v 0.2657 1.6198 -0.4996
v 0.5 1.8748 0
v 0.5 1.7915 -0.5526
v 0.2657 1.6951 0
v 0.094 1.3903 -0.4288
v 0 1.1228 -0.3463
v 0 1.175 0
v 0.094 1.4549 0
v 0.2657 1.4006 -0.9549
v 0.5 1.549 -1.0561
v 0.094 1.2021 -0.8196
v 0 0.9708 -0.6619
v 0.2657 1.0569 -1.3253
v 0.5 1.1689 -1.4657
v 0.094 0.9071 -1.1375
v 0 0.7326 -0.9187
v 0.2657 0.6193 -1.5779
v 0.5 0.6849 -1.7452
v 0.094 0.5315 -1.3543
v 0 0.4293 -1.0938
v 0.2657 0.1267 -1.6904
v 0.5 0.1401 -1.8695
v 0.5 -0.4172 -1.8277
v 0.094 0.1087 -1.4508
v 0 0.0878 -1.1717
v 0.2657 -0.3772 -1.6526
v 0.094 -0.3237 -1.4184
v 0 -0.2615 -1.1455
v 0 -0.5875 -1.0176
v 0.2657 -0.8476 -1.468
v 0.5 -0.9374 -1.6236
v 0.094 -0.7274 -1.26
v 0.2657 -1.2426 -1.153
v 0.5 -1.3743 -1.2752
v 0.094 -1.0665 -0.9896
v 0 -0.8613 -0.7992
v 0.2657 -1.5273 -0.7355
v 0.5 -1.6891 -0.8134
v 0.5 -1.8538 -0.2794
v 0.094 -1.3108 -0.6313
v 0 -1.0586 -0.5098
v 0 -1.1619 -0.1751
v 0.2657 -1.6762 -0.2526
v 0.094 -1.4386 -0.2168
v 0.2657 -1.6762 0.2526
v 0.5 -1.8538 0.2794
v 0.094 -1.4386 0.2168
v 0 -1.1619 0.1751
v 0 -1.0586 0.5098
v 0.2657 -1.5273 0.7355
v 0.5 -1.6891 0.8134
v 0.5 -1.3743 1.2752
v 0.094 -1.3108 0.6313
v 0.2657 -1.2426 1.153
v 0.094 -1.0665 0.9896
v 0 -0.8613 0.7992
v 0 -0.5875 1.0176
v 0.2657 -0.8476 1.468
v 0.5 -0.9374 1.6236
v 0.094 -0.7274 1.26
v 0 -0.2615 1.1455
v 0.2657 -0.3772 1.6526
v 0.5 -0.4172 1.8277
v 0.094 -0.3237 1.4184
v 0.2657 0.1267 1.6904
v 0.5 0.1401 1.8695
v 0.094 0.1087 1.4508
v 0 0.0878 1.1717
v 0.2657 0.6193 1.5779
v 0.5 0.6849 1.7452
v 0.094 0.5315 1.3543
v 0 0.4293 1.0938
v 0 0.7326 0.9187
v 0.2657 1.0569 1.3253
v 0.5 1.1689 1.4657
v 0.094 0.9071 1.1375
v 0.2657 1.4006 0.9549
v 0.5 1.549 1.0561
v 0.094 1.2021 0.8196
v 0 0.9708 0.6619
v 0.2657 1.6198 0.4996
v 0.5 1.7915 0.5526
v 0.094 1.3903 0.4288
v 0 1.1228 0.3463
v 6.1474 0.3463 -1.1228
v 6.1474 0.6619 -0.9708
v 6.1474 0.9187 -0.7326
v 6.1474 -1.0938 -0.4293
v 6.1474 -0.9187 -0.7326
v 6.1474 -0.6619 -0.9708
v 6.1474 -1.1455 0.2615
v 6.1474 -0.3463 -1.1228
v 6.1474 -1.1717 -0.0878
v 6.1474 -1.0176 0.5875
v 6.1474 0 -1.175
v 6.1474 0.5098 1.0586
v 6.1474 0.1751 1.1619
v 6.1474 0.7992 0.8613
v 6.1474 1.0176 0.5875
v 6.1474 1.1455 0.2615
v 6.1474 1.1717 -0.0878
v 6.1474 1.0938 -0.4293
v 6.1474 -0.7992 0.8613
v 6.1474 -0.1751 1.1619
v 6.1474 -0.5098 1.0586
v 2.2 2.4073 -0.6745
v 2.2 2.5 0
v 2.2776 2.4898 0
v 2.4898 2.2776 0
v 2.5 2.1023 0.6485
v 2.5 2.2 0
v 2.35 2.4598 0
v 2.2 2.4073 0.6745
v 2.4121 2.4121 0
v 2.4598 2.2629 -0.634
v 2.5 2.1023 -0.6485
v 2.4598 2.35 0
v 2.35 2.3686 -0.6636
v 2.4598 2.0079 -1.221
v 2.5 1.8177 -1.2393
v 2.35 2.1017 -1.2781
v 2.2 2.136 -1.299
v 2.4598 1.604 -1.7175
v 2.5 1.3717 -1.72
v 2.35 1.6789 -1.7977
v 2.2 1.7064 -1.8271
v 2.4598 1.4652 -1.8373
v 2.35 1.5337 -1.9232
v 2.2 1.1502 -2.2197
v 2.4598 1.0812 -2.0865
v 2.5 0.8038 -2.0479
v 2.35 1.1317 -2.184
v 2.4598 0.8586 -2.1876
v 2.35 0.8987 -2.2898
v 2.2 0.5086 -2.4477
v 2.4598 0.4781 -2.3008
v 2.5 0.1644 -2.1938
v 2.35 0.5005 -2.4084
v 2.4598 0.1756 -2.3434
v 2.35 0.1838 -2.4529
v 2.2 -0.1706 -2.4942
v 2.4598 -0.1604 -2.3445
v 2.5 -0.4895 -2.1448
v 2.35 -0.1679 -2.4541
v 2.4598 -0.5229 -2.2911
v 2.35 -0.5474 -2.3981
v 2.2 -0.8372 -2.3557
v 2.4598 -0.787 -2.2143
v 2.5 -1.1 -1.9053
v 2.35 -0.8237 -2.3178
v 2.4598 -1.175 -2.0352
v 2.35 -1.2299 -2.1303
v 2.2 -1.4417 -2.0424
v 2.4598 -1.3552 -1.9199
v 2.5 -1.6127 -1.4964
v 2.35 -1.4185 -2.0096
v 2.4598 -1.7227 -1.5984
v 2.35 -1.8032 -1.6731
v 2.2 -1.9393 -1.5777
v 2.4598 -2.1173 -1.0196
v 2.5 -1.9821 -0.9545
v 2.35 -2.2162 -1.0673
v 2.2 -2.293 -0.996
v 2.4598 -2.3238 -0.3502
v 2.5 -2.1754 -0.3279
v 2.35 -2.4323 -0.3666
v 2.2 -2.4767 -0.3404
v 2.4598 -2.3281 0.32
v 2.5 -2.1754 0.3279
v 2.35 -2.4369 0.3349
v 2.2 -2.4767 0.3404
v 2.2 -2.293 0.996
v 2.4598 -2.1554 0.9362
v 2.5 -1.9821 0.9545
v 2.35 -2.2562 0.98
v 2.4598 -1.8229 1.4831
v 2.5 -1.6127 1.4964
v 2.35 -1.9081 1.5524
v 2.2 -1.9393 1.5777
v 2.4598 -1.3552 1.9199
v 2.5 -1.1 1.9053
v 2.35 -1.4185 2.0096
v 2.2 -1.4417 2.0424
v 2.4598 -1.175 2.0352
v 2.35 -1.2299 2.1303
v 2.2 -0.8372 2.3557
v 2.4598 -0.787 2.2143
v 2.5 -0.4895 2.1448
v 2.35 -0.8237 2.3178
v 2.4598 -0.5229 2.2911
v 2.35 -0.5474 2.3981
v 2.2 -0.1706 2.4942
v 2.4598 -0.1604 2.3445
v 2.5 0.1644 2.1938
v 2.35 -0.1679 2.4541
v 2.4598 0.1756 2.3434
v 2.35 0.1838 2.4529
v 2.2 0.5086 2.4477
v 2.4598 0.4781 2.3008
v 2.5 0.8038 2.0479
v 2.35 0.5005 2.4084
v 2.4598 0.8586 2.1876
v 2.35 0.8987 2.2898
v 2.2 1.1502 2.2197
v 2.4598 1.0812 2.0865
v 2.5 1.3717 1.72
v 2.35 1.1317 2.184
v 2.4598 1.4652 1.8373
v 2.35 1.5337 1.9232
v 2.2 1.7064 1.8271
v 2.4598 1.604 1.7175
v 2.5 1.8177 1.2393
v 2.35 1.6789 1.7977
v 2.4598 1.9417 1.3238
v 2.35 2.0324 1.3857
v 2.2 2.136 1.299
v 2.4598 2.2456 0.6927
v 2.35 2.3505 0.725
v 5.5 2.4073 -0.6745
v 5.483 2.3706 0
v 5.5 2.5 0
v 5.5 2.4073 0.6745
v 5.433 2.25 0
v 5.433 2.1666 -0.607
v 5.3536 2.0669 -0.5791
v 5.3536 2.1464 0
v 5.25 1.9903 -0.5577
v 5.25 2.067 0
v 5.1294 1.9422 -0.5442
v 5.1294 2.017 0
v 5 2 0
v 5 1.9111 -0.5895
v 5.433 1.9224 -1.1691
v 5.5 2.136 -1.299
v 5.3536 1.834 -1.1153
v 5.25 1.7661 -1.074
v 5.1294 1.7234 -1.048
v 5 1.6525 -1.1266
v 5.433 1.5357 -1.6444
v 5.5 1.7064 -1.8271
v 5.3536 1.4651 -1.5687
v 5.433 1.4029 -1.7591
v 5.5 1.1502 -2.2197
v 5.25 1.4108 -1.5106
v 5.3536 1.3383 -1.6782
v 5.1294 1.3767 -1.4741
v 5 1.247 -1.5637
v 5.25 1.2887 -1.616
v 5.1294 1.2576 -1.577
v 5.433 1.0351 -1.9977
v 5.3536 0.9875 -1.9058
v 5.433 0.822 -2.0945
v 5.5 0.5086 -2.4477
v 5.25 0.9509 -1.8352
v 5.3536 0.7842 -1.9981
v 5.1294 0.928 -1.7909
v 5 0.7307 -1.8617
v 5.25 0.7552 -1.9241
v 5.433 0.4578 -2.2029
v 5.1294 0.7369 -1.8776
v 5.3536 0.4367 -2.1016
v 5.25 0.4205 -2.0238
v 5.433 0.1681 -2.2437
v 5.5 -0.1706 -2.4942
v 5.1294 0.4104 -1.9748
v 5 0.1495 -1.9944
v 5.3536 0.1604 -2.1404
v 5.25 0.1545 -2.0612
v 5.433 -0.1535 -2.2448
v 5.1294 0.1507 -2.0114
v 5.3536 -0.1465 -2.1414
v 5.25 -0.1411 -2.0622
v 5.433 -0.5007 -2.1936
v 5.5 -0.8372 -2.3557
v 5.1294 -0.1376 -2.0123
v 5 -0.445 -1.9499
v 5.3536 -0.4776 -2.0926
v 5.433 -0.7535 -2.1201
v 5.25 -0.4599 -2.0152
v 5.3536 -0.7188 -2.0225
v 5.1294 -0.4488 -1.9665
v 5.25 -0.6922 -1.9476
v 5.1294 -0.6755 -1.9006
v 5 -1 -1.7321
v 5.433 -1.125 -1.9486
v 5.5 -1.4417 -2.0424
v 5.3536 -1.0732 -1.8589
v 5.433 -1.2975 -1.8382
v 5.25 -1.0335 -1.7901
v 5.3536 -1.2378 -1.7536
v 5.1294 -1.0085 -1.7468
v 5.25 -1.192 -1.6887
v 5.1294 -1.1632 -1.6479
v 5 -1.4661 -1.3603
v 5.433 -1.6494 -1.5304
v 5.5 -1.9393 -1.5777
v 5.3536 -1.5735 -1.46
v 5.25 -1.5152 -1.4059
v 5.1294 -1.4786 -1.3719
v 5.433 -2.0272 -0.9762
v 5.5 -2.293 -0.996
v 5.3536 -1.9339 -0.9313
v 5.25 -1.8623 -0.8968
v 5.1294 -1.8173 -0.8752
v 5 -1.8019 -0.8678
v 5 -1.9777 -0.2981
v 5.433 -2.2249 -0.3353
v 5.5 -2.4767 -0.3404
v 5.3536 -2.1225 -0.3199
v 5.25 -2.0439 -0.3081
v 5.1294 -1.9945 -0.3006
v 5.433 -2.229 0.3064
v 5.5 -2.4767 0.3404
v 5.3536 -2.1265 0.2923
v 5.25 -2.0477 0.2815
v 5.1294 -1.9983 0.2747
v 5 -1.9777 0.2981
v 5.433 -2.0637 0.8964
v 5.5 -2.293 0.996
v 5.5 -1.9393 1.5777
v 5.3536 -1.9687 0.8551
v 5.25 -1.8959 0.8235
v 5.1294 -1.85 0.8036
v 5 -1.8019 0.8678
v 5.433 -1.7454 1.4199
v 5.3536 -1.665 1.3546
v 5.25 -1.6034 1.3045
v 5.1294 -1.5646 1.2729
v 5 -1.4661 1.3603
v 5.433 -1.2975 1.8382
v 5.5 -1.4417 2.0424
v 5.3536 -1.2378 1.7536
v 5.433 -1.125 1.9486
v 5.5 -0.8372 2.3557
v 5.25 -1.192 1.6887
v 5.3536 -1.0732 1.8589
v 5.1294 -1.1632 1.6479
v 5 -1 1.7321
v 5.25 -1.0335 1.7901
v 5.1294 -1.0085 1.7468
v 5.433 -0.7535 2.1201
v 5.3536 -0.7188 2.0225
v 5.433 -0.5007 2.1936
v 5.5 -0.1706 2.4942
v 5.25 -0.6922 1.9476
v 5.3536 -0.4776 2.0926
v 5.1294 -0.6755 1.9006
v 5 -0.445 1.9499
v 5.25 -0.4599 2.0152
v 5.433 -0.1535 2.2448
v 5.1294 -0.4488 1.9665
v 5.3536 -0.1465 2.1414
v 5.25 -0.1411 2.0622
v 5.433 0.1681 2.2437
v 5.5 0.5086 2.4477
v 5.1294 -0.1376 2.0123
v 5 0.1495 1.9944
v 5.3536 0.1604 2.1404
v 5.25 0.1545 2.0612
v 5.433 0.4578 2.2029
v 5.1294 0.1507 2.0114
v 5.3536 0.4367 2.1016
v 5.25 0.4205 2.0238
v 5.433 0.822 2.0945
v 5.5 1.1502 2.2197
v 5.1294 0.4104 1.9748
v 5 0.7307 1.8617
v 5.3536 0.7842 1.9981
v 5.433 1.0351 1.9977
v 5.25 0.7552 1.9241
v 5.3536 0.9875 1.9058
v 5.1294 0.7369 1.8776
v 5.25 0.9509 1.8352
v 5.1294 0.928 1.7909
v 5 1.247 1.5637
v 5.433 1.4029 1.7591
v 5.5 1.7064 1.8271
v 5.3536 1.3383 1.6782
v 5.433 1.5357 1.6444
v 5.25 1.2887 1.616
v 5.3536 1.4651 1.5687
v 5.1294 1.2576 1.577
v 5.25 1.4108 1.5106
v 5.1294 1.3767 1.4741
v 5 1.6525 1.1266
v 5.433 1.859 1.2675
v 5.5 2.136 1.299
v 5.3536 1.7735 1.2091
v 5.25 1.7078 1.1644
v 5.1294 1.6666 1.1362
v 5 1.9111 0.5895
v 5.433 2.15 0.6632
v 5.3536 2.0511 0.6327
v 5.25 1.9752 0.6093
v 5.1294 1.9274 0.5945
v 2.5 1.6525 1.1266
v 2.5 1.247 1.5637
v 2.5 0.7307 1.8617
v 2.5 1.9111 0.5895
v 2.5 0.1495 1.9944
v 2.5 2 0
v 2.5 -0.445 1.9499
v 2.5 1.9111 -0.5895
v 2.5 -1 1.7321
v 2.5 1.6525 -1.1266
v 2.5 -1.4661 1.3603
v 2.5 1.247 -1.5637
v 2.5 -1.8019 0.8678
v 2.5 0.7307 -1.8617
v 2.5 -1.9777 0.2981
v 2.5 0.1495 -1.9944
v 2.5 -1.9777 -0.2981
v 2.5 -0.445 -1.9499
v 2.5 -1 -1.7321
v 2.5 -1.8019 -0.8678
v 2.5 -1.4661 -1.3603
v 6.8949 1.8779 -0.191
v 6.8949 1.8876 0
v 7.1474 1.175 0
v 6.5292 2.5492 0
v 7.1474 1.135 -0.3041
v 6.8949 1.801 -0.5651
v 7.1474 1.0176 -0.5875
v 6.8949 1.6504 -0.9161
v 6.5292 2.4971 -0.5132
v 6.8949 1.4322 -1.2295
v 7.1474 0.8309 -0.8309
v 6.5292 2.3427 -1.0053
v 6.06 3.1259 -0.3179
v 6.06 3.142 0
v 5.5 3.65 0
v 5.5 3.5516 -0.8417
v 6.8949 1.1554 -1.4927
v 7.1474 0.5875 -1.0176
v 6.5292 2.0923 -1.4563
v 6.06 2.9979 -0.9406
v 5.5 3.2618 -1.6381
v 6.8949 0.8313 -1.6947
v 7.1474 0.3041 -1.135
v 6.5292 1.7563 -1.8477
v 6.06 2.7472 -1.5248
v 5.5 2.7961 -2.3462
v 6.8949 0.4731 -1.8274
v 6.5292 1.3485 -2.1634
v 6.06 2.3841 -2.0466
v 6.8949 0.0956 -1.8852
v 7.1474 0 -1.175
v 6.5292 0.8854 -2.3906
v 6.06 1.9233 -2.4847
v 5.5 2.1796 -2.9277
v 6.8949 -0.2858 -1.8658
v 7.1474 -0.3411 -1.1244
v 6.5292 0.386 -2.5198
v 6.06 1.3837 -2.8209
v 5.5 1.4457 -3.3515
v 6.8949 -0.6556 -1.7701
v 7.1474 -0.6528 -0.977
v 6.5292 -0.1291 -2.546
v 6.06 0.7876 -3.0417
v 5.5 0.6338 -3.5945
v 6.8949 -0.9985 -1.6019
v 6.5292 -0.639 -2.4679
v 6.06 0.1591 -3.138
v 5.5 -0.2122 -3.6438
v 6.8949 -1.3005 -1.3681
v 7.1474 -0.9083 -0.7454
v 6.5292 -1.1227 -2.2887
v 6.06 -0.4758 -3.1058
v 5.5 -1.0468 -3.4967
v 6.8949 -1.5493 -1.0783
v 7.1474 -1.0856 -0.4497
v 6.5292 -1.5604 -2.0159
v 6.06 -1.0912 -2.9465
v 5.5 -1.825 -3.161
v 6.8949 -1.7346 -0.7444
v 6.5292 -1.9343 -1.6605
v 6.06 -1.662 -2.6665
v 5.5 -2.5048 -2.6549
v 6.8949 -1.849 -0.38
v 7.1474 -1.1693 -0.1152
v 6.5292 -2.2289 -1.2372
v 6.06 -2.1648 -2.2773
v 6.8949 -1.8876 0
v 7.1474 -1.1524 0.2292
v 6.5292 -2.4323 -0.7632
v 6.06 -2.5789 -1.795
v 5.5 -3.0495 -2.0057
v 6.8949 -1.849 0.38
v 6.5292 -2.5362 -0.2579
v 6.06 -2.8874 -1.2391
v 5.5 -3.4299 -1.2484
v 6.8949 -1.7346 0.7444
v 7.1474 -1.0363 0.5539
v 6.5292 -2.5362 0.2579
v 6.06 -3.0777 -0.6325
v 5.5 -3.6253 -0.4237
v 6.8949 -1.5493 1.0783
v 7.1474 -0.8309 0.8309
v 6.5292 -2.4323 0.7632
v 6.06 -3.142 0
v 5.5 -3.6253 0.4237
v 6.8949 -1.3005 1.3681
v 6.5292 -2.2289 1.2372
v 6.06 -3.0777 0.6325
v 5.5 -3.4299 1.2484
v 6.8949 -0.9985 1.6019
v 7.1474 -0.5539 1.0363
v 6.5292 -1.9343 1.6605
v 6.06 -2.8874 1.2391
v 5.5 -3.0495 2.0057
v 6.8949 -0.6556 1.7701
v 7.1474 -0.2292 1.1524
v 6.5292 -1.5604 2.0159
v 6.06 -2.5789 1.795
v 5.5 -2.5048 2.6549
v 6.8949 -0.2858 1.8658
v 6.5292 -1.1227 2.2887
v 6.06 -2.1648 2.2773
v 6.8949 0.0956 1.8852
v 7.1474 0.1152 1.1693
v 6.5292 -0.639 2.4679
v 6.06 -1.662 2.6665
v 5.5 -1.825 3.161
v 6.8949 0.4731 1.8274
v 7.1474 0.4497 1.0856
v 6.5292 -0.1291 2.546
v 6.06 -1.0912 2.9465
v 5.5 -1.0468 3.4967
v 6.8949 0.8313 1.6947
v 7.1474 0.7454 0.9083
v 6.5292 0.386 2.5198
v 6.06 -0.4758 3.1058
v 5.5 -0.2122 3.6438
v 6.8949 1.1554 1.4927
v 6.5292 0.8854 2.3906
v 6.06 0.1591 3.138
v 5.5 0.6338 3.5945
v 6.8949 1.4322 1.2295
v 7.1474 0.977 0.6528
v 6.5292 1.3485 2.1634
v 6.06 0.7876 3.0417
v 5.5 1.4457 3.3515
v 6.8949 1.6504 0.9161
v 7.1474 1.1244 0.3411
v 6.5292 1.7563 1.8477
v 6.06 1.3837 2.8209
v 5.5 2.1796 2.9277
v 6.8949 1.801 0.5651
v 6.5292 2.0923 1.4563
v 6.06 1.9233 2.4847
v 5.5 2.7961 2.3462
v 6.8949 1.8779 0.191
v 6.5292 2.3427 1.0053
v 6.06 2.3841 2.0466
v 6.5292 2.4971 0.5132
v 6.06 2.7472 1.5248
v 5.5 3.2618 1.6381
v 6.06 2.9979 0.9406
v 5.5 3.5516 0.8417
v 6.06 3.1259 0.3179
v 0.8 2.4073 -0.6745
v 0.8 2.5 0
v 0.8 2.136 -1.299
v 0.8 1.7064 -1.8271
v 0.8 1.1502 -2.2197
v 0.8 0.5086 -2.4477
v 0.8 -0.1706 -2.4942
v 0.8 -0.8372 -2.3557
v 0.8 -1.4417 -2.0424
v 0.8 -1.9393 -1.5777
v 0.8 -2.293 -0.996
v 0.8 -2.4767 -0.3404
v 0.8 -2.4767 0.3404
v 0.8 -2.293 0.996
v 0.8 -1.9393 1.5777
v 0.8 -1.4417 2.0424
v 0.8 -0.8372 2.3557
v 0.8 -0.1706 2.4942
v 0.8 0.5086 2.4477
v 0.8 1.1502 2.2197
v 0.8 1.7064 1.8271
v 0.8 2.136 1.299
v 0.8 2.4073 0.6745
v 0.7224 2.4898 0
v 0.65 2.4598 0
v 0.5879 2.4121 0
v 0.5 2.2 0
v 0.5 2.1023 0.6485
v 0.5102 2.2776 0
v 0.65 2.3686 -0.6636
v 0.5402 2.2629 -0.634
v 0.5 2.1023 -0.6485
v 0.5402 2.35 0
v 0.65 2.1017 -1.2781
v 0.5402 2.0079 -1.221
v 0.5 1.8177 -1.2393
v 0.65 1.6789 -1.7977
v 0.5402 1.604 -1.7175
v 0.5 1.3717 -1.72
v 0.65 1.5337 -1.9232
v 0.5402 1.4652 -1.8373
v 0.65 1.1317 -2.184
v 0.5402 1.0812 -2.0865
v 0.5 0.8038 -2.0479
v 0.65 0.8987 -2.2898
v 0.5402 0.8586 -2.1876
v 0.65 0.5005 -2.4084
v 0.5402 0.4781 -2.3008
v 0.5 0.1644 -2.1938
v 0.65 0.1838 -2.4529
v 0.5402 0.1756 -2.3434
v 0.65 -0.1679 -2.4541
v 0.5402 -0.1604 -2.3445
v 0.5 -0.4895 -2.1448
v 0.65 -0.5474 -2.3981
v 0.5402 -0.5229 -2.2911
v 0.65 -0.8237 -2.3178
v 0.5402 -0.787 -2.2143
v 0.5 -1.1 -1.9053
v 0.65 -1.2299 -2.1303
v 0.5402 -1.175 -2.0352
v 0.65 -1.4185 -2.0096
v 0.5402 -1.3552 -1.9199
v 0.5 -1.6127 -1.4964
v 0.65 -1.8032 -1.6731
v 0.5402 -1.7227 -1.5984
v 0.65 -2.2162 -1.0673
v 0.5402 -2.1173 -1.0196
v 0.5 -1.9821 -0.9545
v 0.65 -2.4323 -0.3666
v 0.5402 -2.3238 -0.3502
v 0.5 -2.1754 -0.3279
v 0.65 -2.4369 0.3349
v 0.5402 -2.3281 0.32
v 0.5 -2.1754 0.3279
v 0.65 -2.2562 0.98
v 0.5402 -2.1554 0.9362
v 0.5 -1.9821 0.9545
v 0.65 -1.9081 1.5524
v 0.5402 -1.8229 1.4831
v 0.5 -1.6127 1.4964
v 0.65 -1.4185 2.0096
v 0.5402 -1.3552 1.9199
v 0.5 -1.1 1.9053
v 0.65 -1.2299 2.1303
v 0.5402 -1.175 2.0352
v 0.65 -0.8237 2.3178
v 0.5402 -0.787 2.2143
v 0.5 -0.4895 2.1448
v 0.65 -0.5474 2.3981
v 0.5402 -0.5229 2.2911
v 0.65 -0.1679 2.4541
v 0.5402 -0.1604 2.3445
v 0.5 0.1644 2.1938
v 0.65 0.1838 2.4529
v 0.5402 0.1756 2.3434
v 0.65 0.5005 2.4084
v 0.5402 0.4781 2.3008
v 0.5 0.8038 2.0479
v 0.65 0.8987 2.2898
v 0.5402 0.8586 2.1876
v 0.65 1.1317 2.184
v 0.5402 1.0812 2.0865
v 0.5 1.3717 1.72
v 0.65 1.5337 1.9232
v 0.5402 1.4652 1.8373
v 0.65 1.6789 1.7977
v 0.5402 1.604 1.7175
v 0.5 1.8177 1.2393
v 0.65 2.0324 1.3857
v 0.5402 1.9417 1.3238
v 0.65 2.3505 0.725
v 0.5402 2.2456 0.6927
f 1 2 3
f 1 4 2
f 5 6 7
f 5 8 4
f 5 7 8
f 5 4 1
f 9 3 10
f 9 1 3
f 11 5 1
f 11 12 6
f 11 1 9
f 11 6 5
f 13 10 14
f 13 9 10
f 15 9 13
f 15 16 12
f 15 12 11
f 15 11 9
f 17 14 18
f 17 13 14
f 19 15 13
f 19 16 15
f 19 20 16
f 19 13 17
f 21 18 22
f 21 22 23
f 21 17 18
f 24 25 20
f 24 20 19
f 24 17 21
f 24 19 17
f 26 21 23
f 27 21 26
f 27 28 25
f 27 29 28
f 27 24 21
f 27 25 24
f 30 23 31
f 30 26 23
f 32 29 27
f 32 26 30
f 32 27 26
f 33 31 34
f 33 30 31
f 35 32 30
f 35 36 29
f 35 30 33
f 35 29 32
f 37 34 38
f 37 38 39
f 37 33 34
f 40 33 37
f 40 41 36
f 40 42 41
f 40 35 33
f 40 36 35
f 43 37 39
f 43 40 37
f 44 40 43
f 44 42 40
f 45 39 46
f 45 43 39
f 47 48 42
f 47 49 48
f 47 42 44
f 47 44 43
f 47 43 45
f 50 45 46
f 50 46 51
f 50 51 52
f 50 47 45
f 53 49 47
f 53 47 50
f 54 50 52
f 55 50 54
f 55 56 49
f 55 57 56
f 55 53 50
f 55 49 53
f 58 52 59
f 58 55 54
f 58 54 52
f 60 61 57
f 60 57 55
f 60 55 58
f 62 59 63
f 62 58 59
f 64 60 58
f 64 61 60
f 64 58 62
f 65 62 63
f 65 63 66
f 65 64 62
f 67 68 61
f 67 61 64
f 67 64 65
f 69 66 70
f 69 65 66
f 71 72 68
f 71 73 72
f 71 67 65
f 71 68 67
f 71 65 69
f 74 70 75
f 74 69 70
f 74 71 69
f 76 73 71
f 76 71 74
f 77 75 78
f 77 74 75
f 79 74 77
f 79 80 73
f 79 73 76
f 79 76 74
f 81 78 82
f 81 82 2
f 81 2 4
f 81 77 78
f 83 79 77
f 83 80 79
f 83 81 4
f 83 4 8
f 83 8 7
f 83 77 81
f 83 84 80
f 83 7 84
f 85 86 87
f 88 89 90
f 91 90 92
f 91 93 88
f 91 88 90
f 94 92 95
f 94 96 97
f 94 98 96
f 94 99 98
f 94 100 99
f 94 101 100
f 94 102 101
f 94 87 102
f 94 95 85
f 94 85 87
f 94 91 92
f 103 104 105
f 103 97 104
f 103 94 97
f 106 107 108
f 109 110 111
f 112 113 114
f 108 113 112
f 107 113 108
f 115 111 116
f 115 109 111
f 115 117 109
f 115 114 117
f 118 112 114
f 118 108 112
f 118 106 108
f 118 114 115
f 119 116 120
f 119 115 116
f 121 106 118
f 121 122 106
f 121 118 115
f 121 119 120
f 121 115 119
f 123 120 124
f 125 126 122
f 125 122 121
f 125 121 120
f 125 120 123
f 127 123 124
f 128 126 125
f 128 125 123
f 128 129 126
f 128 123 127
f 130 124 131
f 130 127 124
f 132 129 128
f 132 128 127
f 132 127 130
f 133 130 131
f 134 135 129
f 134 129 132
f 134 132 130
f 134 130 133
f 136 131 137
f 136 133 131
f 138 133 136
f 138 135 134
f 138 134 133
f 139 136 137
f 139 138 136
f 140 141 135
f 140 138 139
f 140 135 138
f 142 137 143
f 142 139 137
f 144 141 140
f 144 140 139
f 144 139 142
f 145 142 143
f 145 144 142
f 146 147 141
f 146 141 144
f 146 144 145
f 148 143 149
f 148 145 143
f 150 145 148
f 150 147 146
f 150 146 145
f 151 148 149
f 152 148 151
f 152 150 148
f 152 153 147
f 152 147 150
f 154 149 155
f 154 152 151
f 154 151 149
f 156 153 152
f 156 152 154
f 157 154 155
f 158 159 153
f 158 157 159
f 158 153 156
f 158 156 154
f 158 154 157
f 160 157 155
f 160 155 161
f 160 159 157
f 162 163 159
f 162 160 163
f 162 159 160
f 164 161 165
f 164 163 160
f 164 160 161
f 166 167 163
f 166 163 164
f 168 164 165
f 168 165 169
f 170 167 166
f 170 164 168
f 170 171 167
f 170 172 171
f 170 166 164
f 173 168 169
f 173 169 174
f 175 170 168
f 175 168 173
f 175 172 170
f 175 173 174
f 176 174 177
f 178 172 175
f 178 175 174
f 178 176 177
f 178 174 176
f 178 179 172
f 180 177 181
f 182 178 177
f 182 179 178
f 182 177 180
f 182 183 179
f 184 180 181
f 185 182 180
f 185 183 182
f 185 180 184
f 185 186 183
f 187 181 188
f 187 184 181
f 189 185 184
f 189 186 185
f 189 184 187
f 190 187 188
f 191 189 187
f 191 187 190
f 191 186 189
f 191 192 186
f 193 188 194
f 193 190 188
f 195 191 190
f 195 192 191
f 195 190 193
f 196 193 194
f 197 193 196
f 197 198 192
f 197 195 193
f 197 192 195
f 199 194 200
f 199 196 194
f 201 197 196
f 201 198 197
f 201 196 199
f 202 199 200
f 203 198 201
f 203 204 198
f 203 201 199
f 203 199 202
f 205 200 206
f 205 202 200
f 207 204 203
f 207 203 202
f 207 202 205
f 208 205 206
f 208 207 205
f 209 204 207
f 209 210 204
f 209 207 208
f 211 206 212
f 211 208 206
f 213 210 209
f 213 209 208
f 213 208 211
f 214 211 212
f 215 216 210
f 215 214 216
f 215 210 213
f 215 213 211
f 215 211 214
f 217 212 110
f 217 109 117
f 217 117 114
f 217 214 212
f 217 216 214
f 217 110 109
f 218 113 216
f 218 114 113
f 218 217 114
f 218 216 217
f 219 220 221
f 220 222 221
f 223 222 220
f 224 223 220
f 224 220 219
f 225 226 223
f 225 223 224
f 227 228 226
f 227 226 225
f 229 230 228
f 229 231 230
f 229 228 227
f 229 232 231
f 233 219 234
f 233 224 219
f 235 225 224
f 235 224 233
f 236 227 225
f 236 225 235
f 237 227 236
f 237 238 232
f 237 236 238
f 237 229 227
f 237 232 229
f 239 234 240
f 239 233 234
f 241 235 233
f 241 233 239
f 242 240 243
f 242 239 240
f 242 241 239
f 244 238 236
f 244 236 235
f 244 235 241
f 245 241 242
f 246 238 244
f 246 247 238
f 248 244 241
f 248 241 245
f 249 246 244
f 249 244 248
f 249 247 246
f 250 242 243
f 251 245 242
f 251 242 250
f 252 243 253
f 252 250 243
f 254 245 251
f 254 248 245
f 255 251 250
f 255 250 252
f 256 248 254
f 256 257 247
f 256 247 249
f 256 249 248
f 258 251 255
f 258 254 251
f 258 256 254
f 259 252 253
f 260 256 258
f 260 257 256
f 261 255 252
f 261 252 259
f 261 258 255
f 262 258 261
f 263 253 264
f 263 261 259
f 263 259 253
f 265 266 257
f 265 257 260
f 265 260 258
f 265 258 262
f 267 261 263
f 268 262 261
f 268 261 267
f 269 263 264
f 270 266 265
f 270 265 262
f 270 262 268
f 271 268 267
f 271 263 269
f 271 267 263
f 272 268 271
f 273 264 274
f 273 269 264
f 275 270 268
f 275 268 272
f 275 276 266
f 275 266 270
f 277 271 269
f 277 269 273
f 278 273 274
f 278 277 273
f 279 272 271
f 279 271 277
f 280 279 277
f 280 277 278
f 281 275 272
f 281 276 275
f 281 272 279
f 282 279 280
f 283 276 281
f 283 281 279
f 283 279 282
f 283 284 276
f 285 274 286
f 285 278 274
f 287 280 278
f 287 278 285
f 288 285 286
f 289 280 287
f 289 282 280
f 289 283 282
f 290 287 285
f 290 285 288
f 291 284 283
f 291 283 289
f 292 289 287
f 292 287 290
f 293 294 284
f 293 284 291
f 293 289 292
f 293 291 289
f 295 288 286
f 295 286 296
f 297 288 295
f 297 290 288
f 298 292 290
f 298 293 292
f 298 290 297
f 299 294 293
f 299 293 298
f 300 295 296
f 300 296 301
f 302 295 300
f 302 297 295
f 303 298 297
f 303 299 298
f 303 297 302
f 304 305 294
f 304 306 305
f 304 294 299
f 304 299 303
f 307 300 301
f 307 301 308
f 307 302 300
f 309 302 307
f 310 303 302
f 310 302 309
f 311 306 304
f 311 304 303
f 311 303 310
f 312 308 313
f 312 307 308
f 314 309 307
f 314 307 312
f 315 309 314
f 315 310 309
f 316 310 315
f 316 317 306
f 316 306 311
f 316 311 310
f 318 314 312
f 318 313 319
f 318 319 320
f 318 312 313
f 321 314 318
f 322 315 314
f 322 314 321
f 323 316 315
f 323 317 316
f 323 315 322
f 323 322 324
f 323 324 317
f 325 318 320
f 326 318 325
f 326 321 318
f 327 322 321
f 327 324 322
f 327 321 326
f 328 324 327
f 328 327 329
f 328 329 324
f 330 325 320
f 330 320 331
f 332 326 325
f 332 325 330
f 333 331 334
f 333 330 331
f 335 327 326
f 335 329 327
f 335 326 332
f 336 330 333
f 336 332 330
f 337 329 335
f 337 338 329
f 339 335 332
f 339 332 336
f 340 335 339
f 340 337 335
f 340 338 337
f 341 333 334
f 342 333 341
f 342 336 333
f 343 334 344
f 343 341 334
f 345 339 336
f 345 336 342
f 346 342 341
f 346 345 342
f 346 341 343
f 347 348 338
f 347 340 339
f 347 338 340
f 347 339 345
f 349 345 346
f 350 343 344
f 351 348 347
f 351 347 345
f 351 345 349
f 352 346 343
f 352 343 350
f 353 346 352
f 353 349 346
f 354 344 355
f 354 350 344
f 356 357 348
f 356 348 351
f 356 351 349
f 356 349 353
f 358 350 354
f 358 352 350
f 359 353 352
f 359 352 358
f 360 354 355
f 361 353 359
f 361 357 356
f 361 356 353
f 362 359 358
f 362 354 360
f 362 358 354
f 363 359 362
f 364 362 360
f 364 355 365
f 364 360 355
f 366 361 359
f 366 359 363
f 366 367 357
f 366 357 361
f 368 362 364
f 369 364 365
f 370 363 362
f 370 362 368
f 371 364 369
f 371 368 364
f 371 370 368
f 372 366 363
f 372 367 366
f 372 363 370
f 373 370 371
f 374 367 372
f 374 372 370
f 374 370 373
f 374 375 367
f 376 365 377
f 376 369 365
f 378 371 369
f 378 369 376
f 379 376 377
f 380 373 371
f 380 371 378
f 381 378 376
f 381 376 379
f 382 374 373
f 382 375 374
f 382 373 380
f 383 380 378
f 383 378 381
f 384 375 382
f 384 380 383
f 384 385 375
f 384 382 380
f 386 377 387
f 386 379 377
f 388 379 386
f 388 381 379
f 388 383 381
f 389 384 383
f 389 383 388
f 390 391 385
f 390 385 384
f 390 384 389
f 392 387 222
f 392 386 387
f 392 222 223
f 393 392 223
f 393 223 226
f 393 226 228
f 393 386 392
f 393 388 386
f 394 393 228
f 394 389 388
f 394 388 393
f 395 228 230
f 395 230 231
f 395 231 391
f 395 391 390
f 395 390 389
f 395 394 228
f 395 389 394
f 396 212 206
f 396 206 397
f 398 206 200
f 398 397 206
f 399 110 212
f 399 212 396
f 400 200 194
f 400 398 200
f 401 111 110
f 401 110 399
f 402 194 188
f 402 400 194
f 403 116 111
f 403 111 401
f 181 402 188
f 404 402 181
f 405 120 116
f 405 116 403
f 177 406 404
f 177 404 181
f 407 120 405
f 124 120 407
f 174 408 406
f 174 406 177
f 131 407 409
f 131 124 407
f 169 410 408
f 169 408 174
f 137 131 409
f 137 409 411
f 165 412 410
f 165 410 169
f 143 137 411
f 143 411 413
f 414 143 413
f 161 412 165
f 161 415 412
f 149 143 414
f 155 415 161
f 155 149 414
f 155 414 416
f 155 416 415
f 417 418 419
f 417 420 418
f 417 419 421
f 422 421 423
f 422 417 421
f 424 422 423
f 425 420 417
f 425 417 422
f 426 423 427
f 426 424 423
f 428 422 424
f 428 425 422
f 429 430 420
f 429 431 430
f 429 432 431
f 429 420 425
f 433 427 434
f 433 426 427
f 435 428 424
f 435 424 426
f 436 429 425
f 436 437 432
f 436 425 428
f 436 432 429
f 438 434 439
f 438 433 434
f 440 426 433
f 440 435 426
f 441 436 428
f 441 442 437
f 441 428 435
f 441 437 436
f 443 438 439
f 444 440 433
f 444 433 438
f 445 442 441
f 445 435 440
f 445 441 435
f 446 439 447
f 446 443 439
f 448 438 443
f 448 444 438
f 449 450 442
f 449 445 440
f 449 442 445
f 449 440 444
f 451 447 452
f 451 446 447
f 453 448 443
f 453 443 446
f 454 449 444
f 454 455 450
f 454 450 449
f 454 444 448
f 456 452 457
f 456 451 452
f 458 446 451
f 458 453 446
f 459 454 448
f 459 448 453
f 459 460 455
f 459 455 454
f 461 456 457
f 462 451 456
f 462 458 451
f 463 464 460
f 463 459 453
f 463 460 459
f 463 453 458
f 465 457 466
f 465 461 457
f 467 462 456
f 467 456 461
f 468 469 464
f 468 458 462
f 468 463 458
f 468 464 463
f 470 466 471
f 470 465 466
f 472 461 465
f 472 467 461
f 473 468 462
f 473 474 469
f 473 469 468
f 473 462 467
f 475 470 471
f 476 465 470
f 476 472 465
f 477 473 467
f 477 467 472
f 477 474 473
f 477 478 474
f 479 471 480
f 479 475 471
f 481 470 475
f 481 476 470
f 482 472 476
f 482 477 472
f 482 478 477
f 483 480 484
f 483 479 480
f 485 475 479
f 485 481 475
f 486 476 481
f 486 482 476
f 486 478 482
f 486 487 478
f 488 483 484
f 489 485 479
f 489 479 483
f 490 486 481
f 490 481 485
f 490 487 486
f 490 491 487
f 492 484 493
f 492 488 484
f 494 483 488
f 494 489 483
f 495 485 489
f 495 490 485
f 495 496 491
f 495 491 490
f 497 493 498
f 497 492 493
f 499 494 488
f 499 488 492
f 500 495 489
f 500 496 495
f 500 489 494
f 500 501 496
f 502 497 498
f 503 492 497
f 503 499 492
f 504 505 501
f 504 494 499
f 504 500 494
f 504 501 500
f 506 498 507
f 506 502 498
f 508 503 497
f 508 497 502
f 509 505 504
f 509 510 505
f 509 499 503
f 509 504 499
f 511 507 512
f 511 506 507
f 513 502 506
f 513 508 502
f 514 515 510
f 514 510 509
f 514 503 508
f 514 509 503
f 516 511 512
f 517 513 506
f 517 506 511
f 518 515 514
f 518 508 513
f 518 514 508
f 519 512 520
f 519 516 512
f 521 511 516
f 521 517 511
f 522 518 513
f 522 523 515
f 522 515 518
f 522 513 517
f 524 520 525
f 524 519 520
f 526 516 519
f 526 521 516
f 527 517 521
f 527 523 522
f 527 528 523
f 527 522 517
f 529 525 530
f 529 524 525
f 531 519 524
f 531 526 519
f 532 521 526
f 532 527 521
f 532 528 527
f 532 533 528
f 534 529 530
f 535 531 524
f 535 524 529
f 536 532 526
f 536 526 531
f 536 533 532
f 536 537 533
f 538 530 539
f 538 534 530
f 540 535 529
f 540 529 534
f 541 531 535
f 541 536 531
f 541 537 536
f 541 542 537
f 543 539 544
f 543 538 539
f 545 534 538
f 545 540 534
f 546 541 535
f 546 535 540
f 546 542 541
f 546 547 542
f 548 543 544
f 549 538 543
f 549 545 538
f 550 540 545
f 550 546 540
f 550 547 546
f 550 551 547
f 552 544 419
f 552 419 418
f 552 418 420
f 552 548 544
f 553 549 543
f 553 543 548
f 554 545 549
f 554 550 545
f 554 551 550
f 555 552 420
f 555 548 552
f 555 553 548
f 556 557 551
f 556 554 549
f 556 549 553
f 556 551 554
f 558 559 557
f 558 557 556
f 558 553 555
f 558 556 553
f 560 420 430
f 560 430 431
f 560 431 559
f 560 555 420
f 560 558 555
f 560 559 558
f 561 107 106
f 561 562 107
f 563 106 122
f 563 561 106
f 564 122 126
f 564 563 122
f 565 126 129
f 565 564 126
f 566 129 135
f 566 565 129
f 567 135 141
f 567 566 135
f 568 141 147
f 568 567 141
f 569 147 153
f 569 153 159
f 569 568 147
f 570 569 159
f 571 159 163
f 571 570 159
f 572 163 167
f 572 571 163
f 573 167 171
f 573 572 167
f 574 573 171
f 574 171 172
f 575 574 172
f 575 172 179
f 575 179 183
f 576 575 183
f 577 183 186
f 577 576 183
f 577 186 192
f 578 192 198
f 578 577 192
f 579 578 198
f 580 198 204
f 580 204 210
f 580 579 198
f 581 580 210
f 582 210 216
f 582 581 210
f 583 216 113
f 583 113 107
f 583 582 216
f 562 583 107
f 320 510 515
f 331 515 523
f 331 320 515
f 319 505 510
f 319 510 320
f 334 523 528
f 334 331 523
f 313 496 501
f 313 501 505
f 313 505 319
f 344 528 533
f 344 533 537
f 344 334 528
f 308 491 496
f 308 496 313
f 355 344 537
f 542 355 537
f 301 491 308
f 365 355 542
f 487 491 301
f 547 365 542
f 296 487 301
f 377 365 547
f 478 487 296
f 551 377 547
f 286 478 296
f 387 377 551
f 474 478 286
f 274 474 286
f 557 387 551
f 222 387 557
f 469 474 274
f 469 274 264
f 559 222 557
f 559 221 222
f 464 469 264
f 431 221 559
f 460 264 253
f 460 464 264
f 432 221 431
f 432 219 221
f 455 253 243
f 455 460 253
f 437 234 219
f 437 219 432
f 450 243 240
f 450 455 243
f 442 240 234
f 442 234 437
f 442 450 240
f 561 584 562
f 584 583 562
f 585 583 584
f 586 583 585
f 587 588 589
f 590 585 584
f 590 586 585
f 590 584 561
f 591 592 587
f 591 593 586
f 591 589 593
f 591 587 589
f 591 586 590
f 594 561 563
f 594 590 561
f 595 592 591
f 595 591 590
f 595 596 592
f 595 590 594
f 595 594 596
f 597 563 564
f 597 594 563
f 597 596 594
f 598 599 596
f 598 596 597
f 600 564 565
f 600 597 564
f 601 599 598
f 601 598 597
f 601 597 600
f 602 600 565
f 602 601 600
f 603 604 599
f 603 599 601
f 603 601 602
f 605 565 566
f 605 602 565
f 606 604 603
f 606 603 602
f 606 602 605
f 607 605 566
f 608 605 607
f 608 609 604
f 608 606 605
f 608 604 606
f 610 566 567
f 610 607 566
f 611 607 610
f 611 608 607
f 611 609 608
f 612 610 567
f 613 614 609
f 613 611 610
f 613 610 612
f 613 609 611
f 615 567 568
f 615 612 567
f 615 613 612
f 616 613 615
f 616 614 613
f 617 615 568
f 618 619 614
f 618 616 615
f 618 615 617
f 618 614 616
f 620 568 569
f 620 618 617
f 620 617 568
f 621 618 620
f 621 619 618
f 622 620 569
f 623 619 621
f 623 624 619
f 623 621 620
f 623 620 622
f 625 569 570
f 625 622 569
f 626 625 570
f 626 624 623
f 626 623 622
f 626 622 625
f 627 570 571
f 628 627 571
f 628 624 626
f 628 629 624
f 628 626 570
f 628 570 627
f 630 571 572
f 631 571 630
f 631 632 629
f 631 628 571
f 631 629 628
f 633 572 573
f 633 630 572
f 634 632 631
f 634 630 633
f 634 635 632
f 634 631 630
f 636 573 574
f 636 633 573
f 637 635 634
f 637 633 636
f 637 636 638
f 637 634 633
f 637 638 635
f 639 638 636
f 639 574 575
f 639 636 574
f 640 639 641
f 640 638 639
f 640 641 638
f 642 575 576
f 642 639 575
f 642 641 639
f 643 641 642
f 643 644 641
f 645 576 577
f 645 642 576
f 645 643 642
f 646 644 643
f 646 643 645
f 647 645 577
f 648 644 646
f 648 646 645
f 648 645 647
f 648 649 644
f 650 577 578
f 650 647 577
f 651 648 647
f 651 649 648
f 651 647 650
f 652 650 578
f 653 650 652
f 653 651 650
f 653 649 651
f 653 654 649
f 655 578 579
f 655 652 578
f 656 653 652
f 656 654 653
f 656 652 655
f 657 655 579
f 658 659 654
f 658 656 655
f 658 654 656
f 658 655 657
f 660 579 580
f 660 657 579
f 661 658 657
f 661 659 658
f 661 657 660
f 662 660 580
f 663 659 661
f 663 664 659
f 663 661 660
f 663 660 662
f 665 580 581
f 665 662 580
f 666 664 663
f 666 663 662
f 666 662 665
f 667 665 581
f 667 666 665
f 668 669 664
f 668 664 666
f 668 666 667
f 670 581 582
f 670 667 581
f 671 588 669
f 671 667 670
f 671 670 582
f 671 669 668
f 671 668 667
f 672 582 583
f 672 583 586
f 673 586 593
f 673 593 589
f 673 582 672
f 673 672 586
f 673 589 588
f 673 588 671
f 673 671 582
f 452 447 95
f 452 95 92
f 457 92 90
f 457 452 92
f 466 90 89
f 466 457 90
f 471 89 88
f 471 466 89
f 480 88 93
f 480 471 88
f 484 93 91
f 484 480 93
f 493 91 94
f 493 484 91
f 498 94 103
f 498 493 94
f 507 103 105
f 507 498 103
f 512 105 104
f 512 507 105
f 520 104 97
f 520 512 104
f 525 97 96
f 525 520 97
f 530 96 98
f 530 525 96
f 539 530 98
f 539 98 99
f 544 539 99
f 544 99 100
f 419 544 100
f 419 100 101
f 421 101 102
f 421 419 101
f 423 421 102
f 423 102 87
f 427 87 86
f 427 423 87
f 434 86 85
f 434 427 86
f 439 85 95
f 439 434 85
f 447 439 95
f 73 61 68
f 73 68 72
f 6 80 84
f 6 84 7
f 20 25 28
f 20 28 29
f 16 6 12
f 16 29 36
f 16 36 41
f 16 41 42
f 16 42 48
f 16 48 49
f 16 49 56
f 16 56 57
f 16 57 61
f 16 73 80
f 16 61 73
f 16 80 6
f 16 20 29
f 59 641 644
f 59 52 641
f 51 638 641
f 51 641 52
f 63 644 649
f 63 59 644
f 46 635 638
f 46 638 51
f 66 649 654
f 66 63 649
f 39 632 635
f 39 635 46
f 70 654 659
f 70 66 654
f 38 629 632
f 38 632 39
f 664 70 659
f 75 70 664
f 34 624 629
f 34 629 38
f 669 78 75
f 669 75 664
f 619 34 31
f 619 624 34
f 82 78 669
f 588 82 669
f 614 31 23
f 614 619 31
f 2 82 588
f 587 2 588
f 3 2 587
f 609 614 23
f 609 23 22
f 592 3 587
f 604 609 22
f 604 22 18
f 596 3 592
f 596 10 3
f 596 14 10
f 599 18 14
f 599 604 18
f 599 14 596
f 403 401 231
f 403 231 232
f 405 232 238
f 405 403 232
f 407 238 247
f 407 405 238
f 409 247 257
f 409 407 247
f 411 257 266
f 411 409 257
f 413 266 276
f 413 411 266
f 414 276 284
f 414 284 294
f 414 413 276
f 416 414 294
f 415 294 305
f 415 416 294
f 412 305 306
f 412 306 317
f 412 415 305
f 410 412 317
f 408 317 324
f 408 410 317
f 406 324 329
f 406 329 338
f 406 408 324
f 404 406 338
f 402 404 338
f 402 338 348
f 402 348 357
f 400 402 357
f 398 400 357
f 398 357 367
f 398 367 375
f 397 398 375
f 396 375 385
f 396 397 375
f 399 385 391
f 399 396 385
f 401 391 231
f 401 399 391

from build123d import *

# Parameters (mm, degrees)
FILLET1_R      = 0.5
CHAMFER1_SIZE  = 2.35
CHAMFER1_SIZE2 = 0.629680602
SKETCH_1_W     = 29
SKETCH_1_H     = 1.175


with BuildPart() as part:
    # Sketch1 → Base-Revolve (revolve)
    with BuildSketch(Plane(origin=(-11.603452862, 14.723452862, 0), x_dir=(0, -1, 0), z_dir=(0, 0, 1)), mode=Mode.PRIVATE) as base_revolve_sk:
        with BuildLine():
            Line((16.923452862, 12.103452862), (16.598206218, 12.103452862))
            ThreePointArc((16.598206218, 12.103452862), (16.304826689, 11.774384722), (15.898452862, 11.603452862))
            Line((15.898452862, 11.603452862), (14.723452862, 11.603452862))
            Line((14.723452862, 11.603452862), (14.723452862, 46.750877613))
            Line((14.723452862, 46.750877613), (15.898452862, 46.750877613))
            Line((15.898452862, 46.750877613), (15.898452862, 18.750877613))
            ThreePointArc((15.898452862, 18.750877613), (17.272699482, 18.132605809), (18.373452862, 17.103452862))
            Line((18.373452862, 17.103452862), (16.723452862, 17.103452862))
            Line((16.723452862, 17.103452862), (16.723452862, 14.103452862))
            Line((16.723452862, 14.103452862), (16.923452862, 14.103452862))
            ThreePointArc((16.923452862, 14.103452862), (17.135584897, 14.015584897), (17.223452862, 13.803452862))
            Line((17.223452862, 13.803452862), (17.223452862, 12.403452862))
            ThreePointArc((17.223452862, 12.403452862), (17.135584897, 12.191320828), (16.923452862, 12.103452862))
        make_face()
    revolve(base_revolve_sk.sketch.rotate(Axis((22.234231882, 0, 0), (-1, 0, 0)), 180), axis=Axis((22.234231882, 0, 0), (-1, 0, 0)))

    # Fillet1
    fillet1_edges = [part.edges().sort_by_distance(p)[0] for p in [
        (5.5, -2, 0),
    ]]
    fillet(fillet1_edges, radius=FILLET1_R)

    # Chamfer1
    chamfer1_edges = [part.edges().sort_by_distance(p)[0] for p in [
        (35.14742475, -1.175, 0),
    ]]
    chamfer1_side = [part.faces().sort_by_distance(p)[0] for p in [
        (21.14742475, -1.175, 0),
    ]]
    chamfer(chamfer1_edges, length=CHAMFER1_SIZE, length2=CHAMFER1_SIZE2, reference=chamfer1_side[0])

    # Эскиз1 → Вырез-Повернуть1 (revolve, cut)
    with BuildSketch(Plane(origin=(0, 0, 0), x_dir=(1, 0, 0), z_dir=(0, 1, 0))):
        with Locations((20.64742475, 0.5875)):
            Rectangle(SKETCH_1_W, SKETCH_1_H)
    revolve(axis=Axis((35.14742475, 0, 0), (-1, 0, 0)), mode=Mode.SUBTRACT)


solid = part.part
